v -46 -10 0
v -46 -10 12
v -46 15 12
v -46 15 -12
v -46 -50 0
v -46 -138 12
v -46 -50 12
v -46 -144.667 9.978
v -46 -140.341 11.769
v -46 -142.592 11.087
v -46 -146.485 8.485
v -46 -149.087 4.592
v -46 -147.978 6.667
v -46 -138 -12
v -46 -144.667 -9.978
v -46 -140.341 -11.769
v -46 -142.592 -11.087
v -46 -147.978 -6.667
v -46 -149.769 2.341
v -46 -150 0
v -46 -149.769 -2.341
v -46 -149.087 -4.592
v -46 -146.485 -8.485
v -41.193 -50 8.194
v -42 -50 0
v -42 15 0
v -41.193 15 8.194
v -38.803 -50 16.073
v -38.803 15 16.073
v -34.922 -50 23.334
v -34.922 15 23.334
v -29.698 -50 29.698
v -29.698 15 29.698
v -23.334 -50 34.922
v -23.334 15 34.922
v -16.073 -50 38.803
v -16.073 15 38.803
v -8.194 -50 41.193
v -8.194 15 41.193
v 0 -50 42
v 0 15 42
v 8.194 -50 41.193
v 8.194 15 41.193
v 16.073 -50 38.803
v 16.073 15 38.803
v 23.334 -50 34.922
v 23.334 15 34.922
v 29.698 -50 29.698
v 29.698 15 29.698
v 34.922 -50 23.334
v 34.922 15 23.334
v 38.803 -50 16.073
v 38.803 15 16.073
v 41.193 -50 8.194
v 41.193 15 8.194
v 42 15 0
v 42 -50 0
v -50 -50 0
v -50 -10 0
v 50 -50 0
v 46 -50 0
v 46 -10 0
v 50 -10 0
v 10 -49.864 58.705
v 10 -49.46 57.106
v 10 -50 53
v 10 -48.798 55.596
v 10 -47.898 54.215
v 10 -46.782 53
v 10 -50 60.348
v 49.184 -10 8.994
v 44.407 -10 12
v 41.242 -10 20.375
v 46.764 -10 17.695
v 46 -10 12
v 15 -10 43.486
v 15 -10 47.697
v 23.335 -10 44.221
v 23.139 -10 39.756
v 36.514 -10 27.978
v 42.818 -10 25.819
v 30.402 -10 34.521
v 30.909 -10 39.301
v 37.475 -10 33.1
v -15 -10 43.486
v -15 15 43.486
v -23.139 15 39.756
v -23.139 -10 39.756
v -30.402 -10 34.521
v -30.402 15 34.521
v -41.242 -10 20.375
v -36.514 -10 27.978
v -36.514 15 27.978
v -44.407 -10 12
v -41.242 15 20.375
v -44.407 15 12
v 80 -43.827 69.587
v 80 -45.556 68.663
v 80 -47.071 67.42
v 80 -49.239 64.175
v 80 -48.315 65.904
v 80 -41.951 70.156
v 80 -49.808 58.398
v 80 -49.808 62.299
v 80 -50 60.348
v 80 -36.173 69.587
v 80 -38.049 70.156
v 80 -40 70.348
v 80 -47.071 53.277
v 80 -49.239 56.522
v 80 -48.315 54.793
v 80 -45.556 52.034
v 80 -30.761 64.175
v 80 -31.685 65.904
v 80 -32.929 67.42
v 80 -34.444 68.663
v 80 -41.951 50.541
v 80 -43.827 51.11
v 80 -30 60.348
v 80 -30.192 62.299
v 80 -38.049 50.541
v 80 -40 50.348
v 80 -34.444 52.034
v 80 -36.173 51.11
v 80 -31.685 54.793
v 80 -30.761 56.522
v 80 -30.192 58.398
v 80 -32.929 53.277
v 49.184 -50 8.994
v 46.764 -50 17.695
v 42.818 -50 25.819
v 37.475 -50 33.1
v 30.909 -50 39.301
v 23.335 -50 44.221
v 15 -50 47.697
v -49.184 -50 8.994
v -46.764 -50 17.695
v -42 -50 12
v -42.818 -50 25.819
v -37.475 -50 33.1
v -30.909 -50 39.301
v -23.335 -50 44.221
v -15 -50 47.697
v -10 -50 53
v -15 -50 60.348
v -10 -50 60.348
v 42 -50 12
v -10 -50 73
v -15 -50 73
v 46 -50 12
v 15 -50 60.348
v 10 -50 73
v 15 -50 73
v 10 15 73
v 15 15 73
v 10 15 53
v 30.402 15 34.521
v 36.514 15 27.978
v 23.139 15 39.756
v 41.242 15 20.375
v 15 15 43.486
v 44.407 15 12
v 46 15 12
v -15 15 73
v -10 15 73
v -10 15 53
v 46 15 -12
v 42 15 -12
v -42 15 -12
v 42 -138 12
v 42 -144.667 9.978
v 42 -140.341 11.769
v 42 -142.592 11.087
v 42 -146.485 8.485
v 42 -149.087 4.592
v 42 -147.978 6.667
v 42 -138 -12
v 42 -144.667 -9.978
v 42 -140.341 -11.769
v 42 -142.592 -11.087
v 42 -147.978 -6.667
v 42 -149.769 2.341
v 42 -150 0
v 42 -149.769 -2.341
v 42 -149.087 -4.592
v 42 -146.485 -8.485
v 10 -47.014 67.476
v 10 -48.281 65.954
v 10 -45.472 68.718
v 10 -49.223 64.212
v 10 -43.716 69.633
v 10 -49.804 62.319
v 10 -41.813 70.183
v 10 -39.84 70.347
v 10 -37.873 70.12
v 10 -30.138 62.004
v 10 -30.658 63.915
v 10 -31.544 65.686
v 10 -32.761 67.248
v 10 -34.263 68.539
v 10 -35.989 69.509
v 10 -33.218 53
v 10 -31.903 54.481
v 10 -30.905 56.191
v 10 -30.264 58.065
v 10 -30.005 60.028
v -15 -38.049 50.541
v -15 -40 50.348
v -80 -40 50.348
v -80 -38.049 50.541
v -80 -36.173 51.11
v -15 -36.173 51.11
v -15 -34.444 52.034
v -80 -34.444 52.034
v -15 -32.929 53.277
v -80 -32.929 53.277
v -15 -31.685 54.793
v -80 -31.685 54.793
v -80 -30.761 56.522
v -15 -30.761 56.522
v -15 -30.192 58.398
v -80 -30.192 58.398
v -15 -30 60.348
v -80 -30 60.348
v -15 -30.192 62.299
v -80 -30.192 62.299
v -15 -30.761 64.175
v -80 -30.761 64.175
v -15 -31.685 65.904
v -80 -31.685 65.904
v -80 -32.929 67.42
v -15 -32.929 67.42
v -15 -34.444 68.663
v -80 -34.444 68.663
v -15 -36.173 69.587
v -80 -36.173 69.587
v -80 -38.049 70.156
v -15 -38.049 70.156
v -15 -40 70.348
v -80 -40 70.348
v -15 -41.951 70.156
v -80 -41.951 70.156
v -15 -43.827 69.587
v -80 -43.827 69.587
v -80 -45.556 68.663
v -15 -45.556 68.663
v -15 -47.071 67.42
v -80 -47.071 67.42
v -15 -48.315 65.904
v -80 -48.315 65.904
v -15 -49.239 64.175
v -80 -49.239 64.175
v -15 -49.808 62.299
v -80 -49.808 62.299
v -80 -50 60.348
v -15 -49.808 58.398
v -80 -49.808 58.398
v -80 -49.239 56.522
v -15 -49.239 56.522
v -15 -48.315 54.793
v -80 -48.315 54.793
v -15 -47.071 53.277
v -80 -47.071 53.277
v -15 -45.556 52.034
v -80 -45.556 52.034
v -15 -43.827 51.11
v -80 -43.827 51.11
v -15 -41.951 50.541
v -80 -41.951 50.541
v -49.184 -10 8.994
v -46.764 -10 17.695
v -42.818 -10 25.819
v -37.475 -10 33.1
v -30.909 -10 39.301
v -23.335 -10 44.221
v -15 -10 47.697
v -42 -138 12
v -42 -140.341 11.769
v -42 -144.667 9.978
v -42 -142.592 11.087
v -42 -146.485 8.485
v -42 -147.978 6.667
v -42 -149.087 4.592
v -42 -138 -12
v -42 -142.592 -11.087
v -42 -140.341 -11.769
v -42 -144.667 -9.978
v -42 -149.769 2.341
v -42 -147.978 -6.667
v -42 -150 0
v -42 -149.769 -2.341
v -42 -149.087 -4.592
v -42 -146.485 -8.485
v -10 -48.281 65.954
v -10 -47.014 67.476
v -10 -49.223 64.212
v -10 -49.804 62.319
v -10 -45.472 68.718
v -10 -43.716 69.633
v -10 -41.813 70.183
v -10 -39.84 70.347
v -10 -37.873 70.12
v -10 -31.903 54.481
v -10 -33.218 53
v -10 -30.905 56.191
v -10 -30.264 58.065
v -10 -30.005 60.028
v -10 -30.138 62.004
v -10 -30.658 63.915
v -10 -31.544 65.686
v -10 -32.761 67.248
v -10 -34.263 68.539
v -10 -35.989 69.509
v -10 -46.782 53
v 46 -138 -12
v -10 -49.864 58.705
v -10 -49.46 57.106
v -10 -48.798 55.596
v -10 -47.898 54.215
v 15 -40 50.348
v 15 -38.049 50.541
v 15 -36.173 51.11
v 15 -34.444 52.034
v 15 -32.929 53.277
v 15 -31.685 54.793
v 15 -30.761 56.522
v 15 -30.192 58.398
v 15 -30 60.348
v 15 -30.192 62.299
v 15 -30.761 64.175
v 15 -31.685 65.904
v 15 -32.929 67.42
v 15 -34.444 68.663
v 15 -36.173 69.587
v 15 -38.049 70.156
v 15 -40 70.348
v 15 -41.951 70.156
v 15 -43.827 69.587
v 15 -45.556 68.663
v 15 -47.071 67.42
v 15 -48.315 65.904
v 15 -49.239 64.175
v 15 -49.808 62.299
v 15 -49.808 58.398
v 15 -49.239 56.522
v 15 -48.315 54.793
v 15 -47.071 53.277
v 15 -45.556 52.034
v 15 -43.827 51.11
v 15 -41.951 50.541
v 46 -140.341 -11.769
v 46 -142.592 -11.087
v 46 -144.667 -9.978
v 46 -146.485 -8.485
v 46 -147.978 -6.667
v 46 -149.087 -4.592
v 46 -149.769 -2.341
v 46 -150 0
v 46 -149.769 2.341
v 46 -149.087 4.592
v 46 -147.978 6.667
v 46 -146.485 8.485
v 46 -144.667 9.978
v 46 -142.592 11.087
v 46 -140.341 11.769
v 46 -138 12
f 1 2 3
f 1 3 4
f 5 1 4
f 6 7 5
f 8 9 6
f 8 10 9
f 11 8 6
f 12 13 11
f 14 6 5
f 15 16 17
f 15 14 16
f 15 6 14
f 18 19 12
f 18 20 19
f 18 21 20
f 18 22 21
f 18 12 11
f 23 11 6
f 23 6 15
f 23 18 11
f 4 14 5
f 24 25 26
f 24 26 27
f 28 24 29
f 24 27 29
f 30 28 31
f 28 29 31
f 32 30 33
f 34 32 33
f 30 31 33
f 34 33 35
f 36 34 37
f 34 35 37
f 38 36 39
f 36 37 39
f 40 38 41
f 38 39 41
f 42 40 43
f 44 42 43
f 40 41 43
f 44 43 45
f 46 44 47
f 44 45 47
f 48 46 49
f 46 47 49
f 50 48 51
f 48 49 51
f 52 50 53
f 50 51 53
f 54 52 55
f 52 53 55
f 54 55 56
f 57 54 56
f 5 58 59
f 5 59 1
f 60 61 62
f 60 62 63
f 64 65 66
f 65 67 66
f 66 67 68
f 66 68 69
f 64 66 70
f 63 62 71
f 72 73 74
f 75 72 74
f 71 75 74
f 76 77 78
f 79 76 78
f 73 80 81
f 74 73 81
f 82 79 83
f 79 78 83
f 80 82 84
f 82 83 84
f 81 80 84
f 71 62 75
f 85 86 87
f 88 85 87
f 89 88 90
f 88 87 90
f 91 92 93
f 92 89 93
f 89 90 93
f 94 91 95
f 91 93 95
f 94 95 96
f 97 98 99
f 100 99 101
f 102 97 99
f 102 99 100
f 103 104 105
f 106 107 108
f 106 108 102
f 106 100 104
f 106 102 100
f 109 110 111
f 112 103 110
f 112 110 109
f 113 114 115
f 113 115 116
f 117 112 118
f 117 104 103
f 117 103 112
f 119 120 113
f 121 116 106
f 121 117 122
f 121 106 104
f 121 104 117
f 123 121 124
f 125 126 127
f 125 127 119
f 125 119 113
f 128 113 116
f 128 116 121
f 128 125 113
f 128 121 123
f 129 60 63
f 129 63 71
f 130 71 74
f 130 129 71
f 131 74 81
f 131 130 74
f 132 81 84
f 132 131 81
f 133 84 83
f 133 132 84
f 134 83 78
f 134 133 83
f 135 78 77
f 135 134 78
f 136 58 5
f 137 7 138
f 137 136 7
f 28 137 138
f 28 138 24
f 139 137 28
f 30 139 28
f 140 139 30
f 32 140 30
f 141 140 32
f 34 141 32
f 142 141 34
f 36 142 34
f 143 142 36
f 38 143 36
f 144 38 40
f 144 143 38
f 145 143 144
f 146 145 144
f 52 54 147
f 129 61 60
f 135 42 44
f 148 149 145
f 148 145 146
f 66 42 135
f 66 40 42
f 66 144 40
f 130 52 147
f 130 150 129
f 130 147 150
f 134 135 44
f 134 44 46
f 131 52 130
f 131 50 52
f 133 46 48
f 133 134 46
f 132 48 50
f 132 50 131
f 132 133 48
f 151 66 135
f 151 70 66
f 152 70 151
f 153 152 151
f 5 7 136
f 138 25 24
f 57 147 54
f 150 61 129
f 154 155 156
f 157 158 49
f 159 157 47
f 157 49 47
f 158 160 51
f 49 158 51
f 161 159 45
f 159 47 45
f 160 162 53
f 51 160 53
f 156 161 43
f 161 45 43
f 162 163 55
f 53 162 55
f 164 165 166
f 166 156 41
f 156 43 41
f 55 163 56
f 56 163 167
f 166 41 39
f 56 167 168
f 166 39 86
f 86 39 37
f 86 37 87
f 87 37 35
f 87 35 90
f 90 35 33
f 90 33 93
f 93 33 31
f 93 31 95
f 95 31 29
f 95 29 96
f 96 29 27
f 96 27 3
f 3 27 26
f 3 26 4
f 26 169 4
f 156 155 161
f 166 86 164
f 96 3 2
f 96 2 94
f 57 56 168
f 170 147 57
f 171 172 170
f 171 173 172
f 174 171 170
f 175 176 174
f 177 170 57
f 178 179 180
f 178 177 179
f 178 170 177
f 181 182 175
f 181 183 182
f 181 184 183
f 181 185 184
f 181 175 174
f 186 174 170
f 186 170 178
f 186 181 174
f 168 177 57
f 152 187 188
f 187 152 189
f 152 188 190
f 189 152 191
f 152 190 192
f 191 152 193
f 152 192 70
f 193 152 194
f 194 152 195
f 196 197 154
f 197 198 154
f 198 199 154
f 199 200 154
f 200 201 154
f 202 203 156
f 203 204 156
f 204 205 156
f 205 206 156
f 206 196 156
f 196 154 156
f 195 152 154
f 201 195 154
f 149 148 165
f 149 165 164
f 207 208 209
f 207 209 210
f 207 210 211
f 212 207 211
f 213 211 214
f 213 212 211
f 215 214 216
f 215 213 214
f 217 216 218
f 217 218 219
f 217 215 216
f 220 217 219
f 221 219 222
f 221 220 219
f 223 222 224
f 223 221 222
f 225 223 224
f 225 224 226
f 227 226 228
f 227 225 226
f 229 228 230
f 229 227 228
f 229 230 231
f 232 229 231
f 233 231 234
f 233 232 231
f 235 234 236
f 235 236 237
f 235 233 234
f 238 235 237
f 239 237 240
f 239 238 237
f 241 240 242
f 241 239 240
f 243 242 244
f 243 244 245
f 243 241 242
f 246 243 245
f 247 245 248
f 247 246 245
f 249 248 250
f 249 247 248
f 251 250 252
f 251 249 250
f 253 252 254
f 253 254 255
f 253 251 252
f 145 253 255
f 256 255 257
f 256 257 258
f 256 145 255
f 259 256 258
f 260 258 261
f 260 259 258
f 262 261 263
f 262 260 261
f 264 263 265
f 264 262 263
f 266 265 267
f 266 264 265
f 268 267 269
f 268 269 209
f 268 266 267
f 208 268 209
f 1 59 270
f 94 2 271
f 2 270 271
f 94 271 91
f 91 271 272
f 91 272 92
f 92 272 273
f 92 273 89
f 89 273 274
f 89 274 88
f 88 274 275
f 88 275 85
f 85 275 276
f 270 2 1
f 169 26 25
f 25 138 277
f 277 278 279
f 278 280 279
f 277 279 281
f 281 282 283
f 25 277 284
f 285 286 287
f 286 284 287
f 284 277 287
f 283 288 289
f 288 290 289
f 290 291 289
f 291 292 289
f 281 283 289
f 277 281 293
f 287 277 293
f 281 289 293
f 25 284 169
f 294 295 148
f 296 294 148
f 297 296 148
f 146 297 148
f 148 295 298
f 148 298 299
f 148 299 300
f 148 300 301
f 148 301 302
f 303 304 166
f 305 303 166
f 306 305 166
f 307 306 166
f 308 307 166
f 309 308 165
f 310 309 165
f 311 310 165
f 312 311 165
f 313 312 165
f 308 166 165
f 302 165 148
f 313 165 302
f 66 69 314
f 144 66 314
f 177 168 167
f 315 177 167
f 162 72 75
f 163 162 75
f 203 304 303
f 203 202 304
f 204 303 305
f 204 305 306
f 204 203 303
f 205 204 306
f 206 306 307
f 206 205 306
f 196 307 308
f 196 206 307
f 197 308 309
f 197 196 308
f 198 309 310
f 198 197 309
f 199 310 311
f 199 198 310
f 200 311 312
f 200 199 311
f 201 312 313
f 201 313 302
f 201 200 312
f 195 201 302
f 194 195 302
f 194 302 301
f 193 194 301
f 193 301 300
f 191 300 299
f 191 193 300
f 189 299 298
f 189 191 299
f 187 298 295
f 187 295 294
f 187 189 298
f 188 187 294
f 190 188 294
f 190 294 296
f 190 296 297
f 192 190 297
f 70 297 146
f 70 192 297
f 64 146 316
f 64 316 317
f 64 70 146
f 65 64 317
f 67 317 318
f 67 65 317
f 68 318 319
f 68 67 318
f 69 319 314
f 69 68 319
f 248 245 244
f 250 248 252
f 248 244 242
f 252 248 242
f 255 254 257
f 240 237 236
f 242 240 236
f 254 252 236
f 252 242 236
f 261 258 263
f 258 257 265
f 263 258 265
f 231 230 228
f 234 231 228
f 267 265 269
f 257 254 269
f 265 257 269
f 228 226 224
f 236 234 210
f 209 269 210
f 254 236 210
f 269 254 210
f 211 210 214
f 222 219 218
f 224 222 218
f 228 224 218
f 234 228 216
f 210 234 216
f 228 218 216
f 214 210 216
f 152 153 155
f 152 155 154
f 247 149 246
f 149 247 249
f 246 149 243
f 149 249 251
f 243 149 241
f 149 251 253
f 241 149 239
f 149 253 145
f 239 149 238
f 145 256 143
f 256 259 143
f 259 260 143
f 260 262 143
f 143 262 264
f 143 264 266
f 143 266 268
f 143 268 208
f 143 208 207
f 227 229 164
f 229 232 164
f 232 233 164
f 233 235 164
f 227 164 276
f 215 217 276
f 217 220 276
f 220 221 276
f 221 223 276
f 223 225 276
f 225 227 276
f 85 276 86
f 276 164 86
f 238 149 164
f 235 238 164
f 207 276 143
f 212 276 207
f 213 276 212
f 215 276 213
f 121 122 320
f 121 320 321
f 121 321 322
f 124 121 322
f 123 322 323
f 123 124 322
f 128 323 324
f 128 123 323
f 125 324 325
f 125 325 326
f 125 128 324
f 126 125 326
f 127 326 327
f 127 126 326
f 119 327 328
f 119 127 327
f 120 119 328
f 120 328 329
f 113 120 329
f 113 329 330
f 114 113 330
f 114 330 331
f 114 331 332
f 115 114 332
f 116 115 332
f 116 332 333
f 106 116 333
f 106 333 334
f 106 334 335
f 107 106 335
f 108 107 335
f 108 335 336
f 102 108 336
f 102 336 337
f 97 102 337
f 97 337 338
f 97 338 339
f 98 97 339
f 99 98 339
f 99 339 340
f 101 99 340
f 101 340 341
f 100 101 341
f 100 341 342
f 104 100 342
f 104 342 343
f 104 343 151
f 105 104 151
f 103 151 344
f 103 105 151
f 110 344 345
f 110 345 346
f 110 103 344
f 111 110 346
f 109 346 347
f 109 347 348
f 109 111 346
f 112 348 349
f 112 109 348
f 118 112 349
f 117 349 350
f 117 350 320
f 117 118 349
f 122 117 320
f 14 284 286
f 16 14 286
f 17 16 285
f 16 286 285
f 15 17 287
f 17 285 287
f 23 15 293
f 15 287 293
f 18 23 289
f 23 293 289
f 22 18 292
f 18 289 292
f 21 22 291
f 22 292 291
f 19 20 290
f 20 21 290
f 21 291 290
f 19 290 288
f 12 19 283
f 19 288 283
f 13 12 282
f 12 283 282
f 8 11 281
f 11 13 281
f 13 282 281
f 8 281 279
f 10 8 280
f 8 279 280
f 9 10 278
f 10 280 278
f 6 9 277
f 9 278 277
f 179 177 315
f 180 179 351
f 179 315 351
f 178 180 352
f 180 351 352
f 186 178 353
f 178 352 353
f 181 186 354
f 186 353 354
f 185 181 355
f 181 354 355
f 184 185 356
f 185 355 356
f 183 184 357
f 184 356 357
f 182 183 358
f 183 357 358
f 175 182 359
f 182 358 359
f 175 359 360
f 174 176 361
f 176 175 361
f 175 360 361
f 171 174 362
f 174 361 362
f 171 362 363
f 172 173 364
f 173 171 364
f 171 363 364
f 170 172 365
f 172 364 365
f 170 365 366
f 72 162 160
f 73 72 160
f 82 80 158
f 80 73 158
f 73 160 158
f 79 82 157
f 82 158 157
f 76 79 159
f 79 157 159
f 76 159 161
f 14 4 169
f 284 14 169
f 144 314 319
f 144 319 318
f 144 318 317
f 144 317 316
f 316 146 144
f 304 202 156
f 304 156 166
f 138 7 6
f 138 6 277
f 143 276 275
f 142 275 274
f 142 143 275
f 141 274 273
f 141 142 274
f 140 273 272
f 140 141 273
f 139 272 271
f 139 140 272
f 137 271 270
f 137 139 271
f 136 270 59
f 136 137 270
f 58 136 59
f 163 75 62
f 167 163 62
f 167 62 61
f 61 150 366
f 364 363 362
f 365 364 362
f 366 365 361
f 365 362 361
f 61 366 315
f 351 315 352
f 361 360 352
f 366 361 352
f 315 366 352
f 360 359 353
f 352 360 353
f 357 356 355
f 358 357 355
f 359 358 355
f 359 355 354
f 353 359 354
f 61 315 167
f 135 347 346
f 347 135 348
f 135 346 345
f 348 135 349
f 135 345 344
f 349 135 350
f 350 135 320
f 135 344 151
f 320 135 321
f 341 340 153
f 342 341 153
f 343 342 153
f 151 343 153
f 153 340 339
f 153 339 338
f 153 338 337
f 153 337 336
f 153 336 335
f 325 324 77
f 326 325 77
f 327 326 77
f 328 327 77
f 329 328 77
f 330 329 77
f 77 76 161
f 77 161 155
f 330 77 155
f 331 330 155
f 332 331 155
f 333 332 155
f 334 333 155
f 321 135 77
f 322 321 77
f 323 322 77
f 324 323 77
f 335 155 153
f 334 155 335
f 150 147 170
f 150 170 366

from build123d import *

# Parameters (mm, degrees)
EXTRUDE_1_DEPTH     = 50
SKETCH_2_W          = 4
SKETCH_2_H          = 24
EXTRUDE_2_DEPTH     = 210
CUT_EXTRUDE_1_DEPTH = 93
SKETCH_4_W          = 4
SKETCH_4_H          = 24
EXTRUDE_3_DEPTH     = 260
EXTRUDE_4_DEPTH     = 30
SKETCH_6_R          = 4
CUT_EXTRUDE_2_DEPTH = 97
SKETCH_8_W          = 162.90282803
SKETCH_8_H          = 303.086270548
CUT_EXTRUDE_4_DEPTH = 86
EXTRUDE_5_DEPTH     = 40
SKETCH_10_R         = 10
EXTRUDE_6_DEPTH     = 80


with BuildPart() as part:
    # 草图1 → 凸台-拉伸1 (new body, symmetric)
    with BuildSketch(Plane(origin=(0, 0, 0), x_dir=(1, 0, 0), z_dir=(0, 1, 0))):
        with BuildLine():
            Line((-46, 0), (-46, 12))
            Line((-46, 12), (-42, 12))
            Line((-42, 12), (-42, 0))
            ThreePointArc((-42, 0), (0, -42), (42, 0))
            Line((42, 0), (42, 12))
            Line((42, 12), (46, 12))
            Line((46, 12), (46, 0))
            ThreePointArc((46, 0), (37.456641601, -26.702059846), (15, -43.48562981))
            Line((15, -43.48562981), (15, -73))
            Line((15, -73), (10, -73))
            Line((10, -73), (10, -53))
            Line((10, -53), (-10, -53))
            Line((-10, -53), (-10, -73))
            Line((-10, -73), (-15, -73))
            Line((-15, -73), (-15, -43.48562981))
            ThreePointArc((-15, -43.48562981), (-37.456641601, -26.702059846), (-46, 0))
        make_face()
    extrude(amount=EXTRUDE_1_DEPTH, both=True)

    # 草图2 → 凸台-拉伸2 (add)
    with BuildSketch(Plane(origin=(0, 50, 0), x_dir=(1, 0, 0), z_dir=(0, 1, 0))):
        with Locations((-44, 0)):
            Rectangle(SKETCH_2_W, SKETCH_2_H)
        with Locations((44, 0)):
            Rectangle(SKETCH_2_W, SKETCH_2_H)
    extrude(amount=-EXTRUDE_2_DEPTH)

    # 草图3 → 切除-拉伸1 (cut, through all)
    with BuildSketch(Plane(origin=(46, 0, 0), x_dir=(0, 0, -1), z_dir=(1, 0, 0))):
        with BuildLine():
            Line((-12, -138), (-12, -169.379550042))
            Line((-12, -169.379550042), (12, -169.379550042))
            Line((12, -169.379550042), (12, -138))
            ThreePointArc((12, -138), (0, -150), (-12, -138))
        make_face()
    extrude(amount=-CUT_EXTRUDE_1_DEPTH, mode=Mode.SUBTRACT)

    # 草图4 → 凸台-拉伸3 (add)
    with BuildSketch(Plane(origin=(0, 50, 0), x_dir=(1, 0, 0), z_dir=(0, 1, 0))):
        with Locations((44, 0)):
            Rectangle(SKETCH_4_W, SKETCH_4_H)
        with Locations((-44, 0)):
            Rectangle(SKETCH_4_W, SKETCH_4_H)
    extrude(amount=EXTRUDE_3_DEPTH)

    # 草图5 → 凸台-拉伸4 (add)
    with BuildSketch(Plane(origin=(0, 310, 0), x_dir=(1, 0, 0), z_dir=(0, 1, 0))):
        with BuildLine():
            Line((-48.538644398, 12), (-42, 12))
            Line((-42, 12), (-42, 0))
            ThreePointArc((-42, 0), (0, -42), (42, 0))
            Line((42, 0), (42, 12))
            Line((42, 12), (48.538644398, 12))
            ThreePointArc((48.538644398, 12), (0, -50), (-48.538644398, 12))
        make_face()
    extrude(amount=-EXTRUDE_4_DEPTH)

    # 草图6 → 切除-拉伸2 (cut, through all)
    with BuildSketch(Plane(origin=(46, 0, 0), x_dir=(0, 0, -1), z_dir=(1, 0, 0))):
        with Locations((0, 200)):
            Circle(SKETCH_6_R)
    extrude(amount=-CUT_EXTRUDE_2_DEPTH, mode=Mode.SUBTRACT)

    # 草图8 → 切除-拉伸4 (cut, through all)
    with BuildSketch(Plane(origin=(0, 0, -12), x_dir=(-1, 0, 0), z_dir=(0, 0, -1))):
        with Locations((10.670277924, 166.543135274)):
            Rectangle(SKETCH_8_W, SKETCH_8_H)
    extrude(amount=-CUT_EXTRUDE_4_DEPTH, mode=Mode.SUBTRACT)

    # 草图9 → 凸台-拉伸5 (add)
    with BuildSketch(Plane.XZ.offset(50)):
        with BuildLine():
            Line((-50, 0), (-46, 0))
            ThreePointArc((-46, 0), (0, 46), (46, 0))
            Line((46, 0), (50, 0))
            ThreePointArc((50, 0), (0, 50), (-50, 0))
        make_face()
    extrude(amount=-EXTRUDE_5_DEPTH)

    # 草图10 → 凸台-拉伸6 (add, symmetric)
    with BuildSketch(Plane(origin=(0, 0, 0), x_dir=(0, 0, -1), z_dir=(1, 0, 0))):
        with Locations((-60.348480035, -40)):
            Circle(SKETCH_10_R)
    extrude(amount=EXTRUDE_6_DEPTH, both=True)


solid = part.part
